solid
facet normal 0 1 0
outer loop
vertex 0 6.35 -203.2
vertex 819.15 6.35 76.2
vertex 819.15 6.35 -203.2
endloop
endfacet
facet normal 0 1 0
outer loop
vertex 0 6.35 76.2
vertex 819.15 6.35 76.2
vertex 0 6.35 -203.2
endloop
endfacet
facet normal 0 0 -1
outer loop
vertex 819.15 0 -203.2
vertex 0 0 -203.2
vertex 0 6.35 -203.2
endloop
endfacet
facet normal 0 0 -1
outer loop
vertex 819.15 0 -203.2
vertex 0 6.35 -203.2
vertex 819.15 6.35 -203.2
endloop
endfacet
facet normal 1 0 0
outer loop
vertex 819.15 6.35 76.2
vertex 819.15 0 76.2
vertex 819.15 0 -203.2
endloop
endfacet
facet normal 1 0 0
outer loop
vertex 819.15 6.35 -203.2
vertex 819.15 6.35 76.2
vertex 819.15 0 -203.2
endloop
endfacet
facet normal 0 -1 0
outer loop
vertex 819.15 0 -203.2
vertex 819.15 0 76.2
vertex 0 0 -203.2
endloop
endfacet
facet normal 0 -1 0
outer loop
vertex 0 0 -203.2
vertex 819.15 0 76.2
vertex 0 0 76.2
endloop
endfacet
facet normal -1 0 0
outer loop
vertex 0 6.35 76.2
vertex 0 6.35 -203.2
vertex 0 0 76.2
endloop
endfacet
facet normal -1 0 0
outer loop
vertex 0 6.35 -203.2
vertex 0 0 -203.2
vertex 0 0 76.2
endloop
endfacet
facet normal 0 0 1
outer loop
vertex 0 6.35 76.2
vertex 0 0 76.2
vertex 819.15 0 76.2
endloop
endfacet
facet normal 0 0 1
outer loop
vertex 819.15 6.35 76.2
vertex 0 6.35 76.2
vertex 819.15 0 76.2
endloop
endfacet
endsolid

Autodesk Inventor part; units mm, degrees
ref_plane "YZ Plane" through (0, 0, 0) normal (1, 0, 0) x (0, 1, 0)
ref_plane "XZ Plane" through (0, 0, 0) normal (0, 1, 0) x (-1, 0, 0)
ref_plane "XY Plane" through (0, 0, 0) normal (0, 0, 1) x (1, 0, 0)
sketch "Sketch1" plane through (0, 0, 0) normal (0, 1, 0) x (-1, 0, 0)
  line L0 (0, 0) -> (0, -203.2)
  line L1 (0, -203.2) -> (-812.8, -203.2)
  line L2 (-812.8, -203.2) -> (-812.8, 0)
  line L3 (-812.8, 0) -> (0, 0)
  dimension "d0" = 203.2
  dimension "d1" = 812.8
extrude "Extrusion1" add sketch "Sketch1" along normal blind 6.35
sketch "Sketch2" plane through (0, 0, 0) normal (0, 1, 0) x (-1, 0, 0)
  line L0 (-812.8, 0) -> (-812.8, -203.2) projected
  line L1 (-812.8, 0) -> (-819.15, 0)
  line L2 (-819.15, 0) -> (-819.15, -203.2)
  line L3 (-819.15, -203.2) -> (-812.8, -203.2)
  line L4 (-812.8, -203.2) -> (-812.8, 0)
  point P0 (0, 0)
  dimension "d4" = 6.35
extrude "Extrusion2" add sketch "Sketch2" along normal blind 6.35
sketch "Sketch3" plane through (0, 0, 0) normal (0, 1, 0) x (-1, 0, 0)
  line L0 (0, 0) -> (0, 76.2)
  line L1 (0, 76.2) -> (-819.15, 76.2)
  line L2 (-819.15, 76.2) -> (-819.15, 0)
  line L3 (0, -203.2) -> (0, 0) projected
  line L4 (-819.15, 0) -> (0, 0)
  dimension "d7" = 76.2
  dimension "d8" = 819.15
extrude "Extrusion3" add sketch "Sketch3" along normal blind 6.35
sketch "Sketch4" plane through (0, 0, 0) normal (0, 1, 0) x (-1, 0, 0)
  point P0 (0, 0)
properties part number "top_top_plywood_Ocampo"
